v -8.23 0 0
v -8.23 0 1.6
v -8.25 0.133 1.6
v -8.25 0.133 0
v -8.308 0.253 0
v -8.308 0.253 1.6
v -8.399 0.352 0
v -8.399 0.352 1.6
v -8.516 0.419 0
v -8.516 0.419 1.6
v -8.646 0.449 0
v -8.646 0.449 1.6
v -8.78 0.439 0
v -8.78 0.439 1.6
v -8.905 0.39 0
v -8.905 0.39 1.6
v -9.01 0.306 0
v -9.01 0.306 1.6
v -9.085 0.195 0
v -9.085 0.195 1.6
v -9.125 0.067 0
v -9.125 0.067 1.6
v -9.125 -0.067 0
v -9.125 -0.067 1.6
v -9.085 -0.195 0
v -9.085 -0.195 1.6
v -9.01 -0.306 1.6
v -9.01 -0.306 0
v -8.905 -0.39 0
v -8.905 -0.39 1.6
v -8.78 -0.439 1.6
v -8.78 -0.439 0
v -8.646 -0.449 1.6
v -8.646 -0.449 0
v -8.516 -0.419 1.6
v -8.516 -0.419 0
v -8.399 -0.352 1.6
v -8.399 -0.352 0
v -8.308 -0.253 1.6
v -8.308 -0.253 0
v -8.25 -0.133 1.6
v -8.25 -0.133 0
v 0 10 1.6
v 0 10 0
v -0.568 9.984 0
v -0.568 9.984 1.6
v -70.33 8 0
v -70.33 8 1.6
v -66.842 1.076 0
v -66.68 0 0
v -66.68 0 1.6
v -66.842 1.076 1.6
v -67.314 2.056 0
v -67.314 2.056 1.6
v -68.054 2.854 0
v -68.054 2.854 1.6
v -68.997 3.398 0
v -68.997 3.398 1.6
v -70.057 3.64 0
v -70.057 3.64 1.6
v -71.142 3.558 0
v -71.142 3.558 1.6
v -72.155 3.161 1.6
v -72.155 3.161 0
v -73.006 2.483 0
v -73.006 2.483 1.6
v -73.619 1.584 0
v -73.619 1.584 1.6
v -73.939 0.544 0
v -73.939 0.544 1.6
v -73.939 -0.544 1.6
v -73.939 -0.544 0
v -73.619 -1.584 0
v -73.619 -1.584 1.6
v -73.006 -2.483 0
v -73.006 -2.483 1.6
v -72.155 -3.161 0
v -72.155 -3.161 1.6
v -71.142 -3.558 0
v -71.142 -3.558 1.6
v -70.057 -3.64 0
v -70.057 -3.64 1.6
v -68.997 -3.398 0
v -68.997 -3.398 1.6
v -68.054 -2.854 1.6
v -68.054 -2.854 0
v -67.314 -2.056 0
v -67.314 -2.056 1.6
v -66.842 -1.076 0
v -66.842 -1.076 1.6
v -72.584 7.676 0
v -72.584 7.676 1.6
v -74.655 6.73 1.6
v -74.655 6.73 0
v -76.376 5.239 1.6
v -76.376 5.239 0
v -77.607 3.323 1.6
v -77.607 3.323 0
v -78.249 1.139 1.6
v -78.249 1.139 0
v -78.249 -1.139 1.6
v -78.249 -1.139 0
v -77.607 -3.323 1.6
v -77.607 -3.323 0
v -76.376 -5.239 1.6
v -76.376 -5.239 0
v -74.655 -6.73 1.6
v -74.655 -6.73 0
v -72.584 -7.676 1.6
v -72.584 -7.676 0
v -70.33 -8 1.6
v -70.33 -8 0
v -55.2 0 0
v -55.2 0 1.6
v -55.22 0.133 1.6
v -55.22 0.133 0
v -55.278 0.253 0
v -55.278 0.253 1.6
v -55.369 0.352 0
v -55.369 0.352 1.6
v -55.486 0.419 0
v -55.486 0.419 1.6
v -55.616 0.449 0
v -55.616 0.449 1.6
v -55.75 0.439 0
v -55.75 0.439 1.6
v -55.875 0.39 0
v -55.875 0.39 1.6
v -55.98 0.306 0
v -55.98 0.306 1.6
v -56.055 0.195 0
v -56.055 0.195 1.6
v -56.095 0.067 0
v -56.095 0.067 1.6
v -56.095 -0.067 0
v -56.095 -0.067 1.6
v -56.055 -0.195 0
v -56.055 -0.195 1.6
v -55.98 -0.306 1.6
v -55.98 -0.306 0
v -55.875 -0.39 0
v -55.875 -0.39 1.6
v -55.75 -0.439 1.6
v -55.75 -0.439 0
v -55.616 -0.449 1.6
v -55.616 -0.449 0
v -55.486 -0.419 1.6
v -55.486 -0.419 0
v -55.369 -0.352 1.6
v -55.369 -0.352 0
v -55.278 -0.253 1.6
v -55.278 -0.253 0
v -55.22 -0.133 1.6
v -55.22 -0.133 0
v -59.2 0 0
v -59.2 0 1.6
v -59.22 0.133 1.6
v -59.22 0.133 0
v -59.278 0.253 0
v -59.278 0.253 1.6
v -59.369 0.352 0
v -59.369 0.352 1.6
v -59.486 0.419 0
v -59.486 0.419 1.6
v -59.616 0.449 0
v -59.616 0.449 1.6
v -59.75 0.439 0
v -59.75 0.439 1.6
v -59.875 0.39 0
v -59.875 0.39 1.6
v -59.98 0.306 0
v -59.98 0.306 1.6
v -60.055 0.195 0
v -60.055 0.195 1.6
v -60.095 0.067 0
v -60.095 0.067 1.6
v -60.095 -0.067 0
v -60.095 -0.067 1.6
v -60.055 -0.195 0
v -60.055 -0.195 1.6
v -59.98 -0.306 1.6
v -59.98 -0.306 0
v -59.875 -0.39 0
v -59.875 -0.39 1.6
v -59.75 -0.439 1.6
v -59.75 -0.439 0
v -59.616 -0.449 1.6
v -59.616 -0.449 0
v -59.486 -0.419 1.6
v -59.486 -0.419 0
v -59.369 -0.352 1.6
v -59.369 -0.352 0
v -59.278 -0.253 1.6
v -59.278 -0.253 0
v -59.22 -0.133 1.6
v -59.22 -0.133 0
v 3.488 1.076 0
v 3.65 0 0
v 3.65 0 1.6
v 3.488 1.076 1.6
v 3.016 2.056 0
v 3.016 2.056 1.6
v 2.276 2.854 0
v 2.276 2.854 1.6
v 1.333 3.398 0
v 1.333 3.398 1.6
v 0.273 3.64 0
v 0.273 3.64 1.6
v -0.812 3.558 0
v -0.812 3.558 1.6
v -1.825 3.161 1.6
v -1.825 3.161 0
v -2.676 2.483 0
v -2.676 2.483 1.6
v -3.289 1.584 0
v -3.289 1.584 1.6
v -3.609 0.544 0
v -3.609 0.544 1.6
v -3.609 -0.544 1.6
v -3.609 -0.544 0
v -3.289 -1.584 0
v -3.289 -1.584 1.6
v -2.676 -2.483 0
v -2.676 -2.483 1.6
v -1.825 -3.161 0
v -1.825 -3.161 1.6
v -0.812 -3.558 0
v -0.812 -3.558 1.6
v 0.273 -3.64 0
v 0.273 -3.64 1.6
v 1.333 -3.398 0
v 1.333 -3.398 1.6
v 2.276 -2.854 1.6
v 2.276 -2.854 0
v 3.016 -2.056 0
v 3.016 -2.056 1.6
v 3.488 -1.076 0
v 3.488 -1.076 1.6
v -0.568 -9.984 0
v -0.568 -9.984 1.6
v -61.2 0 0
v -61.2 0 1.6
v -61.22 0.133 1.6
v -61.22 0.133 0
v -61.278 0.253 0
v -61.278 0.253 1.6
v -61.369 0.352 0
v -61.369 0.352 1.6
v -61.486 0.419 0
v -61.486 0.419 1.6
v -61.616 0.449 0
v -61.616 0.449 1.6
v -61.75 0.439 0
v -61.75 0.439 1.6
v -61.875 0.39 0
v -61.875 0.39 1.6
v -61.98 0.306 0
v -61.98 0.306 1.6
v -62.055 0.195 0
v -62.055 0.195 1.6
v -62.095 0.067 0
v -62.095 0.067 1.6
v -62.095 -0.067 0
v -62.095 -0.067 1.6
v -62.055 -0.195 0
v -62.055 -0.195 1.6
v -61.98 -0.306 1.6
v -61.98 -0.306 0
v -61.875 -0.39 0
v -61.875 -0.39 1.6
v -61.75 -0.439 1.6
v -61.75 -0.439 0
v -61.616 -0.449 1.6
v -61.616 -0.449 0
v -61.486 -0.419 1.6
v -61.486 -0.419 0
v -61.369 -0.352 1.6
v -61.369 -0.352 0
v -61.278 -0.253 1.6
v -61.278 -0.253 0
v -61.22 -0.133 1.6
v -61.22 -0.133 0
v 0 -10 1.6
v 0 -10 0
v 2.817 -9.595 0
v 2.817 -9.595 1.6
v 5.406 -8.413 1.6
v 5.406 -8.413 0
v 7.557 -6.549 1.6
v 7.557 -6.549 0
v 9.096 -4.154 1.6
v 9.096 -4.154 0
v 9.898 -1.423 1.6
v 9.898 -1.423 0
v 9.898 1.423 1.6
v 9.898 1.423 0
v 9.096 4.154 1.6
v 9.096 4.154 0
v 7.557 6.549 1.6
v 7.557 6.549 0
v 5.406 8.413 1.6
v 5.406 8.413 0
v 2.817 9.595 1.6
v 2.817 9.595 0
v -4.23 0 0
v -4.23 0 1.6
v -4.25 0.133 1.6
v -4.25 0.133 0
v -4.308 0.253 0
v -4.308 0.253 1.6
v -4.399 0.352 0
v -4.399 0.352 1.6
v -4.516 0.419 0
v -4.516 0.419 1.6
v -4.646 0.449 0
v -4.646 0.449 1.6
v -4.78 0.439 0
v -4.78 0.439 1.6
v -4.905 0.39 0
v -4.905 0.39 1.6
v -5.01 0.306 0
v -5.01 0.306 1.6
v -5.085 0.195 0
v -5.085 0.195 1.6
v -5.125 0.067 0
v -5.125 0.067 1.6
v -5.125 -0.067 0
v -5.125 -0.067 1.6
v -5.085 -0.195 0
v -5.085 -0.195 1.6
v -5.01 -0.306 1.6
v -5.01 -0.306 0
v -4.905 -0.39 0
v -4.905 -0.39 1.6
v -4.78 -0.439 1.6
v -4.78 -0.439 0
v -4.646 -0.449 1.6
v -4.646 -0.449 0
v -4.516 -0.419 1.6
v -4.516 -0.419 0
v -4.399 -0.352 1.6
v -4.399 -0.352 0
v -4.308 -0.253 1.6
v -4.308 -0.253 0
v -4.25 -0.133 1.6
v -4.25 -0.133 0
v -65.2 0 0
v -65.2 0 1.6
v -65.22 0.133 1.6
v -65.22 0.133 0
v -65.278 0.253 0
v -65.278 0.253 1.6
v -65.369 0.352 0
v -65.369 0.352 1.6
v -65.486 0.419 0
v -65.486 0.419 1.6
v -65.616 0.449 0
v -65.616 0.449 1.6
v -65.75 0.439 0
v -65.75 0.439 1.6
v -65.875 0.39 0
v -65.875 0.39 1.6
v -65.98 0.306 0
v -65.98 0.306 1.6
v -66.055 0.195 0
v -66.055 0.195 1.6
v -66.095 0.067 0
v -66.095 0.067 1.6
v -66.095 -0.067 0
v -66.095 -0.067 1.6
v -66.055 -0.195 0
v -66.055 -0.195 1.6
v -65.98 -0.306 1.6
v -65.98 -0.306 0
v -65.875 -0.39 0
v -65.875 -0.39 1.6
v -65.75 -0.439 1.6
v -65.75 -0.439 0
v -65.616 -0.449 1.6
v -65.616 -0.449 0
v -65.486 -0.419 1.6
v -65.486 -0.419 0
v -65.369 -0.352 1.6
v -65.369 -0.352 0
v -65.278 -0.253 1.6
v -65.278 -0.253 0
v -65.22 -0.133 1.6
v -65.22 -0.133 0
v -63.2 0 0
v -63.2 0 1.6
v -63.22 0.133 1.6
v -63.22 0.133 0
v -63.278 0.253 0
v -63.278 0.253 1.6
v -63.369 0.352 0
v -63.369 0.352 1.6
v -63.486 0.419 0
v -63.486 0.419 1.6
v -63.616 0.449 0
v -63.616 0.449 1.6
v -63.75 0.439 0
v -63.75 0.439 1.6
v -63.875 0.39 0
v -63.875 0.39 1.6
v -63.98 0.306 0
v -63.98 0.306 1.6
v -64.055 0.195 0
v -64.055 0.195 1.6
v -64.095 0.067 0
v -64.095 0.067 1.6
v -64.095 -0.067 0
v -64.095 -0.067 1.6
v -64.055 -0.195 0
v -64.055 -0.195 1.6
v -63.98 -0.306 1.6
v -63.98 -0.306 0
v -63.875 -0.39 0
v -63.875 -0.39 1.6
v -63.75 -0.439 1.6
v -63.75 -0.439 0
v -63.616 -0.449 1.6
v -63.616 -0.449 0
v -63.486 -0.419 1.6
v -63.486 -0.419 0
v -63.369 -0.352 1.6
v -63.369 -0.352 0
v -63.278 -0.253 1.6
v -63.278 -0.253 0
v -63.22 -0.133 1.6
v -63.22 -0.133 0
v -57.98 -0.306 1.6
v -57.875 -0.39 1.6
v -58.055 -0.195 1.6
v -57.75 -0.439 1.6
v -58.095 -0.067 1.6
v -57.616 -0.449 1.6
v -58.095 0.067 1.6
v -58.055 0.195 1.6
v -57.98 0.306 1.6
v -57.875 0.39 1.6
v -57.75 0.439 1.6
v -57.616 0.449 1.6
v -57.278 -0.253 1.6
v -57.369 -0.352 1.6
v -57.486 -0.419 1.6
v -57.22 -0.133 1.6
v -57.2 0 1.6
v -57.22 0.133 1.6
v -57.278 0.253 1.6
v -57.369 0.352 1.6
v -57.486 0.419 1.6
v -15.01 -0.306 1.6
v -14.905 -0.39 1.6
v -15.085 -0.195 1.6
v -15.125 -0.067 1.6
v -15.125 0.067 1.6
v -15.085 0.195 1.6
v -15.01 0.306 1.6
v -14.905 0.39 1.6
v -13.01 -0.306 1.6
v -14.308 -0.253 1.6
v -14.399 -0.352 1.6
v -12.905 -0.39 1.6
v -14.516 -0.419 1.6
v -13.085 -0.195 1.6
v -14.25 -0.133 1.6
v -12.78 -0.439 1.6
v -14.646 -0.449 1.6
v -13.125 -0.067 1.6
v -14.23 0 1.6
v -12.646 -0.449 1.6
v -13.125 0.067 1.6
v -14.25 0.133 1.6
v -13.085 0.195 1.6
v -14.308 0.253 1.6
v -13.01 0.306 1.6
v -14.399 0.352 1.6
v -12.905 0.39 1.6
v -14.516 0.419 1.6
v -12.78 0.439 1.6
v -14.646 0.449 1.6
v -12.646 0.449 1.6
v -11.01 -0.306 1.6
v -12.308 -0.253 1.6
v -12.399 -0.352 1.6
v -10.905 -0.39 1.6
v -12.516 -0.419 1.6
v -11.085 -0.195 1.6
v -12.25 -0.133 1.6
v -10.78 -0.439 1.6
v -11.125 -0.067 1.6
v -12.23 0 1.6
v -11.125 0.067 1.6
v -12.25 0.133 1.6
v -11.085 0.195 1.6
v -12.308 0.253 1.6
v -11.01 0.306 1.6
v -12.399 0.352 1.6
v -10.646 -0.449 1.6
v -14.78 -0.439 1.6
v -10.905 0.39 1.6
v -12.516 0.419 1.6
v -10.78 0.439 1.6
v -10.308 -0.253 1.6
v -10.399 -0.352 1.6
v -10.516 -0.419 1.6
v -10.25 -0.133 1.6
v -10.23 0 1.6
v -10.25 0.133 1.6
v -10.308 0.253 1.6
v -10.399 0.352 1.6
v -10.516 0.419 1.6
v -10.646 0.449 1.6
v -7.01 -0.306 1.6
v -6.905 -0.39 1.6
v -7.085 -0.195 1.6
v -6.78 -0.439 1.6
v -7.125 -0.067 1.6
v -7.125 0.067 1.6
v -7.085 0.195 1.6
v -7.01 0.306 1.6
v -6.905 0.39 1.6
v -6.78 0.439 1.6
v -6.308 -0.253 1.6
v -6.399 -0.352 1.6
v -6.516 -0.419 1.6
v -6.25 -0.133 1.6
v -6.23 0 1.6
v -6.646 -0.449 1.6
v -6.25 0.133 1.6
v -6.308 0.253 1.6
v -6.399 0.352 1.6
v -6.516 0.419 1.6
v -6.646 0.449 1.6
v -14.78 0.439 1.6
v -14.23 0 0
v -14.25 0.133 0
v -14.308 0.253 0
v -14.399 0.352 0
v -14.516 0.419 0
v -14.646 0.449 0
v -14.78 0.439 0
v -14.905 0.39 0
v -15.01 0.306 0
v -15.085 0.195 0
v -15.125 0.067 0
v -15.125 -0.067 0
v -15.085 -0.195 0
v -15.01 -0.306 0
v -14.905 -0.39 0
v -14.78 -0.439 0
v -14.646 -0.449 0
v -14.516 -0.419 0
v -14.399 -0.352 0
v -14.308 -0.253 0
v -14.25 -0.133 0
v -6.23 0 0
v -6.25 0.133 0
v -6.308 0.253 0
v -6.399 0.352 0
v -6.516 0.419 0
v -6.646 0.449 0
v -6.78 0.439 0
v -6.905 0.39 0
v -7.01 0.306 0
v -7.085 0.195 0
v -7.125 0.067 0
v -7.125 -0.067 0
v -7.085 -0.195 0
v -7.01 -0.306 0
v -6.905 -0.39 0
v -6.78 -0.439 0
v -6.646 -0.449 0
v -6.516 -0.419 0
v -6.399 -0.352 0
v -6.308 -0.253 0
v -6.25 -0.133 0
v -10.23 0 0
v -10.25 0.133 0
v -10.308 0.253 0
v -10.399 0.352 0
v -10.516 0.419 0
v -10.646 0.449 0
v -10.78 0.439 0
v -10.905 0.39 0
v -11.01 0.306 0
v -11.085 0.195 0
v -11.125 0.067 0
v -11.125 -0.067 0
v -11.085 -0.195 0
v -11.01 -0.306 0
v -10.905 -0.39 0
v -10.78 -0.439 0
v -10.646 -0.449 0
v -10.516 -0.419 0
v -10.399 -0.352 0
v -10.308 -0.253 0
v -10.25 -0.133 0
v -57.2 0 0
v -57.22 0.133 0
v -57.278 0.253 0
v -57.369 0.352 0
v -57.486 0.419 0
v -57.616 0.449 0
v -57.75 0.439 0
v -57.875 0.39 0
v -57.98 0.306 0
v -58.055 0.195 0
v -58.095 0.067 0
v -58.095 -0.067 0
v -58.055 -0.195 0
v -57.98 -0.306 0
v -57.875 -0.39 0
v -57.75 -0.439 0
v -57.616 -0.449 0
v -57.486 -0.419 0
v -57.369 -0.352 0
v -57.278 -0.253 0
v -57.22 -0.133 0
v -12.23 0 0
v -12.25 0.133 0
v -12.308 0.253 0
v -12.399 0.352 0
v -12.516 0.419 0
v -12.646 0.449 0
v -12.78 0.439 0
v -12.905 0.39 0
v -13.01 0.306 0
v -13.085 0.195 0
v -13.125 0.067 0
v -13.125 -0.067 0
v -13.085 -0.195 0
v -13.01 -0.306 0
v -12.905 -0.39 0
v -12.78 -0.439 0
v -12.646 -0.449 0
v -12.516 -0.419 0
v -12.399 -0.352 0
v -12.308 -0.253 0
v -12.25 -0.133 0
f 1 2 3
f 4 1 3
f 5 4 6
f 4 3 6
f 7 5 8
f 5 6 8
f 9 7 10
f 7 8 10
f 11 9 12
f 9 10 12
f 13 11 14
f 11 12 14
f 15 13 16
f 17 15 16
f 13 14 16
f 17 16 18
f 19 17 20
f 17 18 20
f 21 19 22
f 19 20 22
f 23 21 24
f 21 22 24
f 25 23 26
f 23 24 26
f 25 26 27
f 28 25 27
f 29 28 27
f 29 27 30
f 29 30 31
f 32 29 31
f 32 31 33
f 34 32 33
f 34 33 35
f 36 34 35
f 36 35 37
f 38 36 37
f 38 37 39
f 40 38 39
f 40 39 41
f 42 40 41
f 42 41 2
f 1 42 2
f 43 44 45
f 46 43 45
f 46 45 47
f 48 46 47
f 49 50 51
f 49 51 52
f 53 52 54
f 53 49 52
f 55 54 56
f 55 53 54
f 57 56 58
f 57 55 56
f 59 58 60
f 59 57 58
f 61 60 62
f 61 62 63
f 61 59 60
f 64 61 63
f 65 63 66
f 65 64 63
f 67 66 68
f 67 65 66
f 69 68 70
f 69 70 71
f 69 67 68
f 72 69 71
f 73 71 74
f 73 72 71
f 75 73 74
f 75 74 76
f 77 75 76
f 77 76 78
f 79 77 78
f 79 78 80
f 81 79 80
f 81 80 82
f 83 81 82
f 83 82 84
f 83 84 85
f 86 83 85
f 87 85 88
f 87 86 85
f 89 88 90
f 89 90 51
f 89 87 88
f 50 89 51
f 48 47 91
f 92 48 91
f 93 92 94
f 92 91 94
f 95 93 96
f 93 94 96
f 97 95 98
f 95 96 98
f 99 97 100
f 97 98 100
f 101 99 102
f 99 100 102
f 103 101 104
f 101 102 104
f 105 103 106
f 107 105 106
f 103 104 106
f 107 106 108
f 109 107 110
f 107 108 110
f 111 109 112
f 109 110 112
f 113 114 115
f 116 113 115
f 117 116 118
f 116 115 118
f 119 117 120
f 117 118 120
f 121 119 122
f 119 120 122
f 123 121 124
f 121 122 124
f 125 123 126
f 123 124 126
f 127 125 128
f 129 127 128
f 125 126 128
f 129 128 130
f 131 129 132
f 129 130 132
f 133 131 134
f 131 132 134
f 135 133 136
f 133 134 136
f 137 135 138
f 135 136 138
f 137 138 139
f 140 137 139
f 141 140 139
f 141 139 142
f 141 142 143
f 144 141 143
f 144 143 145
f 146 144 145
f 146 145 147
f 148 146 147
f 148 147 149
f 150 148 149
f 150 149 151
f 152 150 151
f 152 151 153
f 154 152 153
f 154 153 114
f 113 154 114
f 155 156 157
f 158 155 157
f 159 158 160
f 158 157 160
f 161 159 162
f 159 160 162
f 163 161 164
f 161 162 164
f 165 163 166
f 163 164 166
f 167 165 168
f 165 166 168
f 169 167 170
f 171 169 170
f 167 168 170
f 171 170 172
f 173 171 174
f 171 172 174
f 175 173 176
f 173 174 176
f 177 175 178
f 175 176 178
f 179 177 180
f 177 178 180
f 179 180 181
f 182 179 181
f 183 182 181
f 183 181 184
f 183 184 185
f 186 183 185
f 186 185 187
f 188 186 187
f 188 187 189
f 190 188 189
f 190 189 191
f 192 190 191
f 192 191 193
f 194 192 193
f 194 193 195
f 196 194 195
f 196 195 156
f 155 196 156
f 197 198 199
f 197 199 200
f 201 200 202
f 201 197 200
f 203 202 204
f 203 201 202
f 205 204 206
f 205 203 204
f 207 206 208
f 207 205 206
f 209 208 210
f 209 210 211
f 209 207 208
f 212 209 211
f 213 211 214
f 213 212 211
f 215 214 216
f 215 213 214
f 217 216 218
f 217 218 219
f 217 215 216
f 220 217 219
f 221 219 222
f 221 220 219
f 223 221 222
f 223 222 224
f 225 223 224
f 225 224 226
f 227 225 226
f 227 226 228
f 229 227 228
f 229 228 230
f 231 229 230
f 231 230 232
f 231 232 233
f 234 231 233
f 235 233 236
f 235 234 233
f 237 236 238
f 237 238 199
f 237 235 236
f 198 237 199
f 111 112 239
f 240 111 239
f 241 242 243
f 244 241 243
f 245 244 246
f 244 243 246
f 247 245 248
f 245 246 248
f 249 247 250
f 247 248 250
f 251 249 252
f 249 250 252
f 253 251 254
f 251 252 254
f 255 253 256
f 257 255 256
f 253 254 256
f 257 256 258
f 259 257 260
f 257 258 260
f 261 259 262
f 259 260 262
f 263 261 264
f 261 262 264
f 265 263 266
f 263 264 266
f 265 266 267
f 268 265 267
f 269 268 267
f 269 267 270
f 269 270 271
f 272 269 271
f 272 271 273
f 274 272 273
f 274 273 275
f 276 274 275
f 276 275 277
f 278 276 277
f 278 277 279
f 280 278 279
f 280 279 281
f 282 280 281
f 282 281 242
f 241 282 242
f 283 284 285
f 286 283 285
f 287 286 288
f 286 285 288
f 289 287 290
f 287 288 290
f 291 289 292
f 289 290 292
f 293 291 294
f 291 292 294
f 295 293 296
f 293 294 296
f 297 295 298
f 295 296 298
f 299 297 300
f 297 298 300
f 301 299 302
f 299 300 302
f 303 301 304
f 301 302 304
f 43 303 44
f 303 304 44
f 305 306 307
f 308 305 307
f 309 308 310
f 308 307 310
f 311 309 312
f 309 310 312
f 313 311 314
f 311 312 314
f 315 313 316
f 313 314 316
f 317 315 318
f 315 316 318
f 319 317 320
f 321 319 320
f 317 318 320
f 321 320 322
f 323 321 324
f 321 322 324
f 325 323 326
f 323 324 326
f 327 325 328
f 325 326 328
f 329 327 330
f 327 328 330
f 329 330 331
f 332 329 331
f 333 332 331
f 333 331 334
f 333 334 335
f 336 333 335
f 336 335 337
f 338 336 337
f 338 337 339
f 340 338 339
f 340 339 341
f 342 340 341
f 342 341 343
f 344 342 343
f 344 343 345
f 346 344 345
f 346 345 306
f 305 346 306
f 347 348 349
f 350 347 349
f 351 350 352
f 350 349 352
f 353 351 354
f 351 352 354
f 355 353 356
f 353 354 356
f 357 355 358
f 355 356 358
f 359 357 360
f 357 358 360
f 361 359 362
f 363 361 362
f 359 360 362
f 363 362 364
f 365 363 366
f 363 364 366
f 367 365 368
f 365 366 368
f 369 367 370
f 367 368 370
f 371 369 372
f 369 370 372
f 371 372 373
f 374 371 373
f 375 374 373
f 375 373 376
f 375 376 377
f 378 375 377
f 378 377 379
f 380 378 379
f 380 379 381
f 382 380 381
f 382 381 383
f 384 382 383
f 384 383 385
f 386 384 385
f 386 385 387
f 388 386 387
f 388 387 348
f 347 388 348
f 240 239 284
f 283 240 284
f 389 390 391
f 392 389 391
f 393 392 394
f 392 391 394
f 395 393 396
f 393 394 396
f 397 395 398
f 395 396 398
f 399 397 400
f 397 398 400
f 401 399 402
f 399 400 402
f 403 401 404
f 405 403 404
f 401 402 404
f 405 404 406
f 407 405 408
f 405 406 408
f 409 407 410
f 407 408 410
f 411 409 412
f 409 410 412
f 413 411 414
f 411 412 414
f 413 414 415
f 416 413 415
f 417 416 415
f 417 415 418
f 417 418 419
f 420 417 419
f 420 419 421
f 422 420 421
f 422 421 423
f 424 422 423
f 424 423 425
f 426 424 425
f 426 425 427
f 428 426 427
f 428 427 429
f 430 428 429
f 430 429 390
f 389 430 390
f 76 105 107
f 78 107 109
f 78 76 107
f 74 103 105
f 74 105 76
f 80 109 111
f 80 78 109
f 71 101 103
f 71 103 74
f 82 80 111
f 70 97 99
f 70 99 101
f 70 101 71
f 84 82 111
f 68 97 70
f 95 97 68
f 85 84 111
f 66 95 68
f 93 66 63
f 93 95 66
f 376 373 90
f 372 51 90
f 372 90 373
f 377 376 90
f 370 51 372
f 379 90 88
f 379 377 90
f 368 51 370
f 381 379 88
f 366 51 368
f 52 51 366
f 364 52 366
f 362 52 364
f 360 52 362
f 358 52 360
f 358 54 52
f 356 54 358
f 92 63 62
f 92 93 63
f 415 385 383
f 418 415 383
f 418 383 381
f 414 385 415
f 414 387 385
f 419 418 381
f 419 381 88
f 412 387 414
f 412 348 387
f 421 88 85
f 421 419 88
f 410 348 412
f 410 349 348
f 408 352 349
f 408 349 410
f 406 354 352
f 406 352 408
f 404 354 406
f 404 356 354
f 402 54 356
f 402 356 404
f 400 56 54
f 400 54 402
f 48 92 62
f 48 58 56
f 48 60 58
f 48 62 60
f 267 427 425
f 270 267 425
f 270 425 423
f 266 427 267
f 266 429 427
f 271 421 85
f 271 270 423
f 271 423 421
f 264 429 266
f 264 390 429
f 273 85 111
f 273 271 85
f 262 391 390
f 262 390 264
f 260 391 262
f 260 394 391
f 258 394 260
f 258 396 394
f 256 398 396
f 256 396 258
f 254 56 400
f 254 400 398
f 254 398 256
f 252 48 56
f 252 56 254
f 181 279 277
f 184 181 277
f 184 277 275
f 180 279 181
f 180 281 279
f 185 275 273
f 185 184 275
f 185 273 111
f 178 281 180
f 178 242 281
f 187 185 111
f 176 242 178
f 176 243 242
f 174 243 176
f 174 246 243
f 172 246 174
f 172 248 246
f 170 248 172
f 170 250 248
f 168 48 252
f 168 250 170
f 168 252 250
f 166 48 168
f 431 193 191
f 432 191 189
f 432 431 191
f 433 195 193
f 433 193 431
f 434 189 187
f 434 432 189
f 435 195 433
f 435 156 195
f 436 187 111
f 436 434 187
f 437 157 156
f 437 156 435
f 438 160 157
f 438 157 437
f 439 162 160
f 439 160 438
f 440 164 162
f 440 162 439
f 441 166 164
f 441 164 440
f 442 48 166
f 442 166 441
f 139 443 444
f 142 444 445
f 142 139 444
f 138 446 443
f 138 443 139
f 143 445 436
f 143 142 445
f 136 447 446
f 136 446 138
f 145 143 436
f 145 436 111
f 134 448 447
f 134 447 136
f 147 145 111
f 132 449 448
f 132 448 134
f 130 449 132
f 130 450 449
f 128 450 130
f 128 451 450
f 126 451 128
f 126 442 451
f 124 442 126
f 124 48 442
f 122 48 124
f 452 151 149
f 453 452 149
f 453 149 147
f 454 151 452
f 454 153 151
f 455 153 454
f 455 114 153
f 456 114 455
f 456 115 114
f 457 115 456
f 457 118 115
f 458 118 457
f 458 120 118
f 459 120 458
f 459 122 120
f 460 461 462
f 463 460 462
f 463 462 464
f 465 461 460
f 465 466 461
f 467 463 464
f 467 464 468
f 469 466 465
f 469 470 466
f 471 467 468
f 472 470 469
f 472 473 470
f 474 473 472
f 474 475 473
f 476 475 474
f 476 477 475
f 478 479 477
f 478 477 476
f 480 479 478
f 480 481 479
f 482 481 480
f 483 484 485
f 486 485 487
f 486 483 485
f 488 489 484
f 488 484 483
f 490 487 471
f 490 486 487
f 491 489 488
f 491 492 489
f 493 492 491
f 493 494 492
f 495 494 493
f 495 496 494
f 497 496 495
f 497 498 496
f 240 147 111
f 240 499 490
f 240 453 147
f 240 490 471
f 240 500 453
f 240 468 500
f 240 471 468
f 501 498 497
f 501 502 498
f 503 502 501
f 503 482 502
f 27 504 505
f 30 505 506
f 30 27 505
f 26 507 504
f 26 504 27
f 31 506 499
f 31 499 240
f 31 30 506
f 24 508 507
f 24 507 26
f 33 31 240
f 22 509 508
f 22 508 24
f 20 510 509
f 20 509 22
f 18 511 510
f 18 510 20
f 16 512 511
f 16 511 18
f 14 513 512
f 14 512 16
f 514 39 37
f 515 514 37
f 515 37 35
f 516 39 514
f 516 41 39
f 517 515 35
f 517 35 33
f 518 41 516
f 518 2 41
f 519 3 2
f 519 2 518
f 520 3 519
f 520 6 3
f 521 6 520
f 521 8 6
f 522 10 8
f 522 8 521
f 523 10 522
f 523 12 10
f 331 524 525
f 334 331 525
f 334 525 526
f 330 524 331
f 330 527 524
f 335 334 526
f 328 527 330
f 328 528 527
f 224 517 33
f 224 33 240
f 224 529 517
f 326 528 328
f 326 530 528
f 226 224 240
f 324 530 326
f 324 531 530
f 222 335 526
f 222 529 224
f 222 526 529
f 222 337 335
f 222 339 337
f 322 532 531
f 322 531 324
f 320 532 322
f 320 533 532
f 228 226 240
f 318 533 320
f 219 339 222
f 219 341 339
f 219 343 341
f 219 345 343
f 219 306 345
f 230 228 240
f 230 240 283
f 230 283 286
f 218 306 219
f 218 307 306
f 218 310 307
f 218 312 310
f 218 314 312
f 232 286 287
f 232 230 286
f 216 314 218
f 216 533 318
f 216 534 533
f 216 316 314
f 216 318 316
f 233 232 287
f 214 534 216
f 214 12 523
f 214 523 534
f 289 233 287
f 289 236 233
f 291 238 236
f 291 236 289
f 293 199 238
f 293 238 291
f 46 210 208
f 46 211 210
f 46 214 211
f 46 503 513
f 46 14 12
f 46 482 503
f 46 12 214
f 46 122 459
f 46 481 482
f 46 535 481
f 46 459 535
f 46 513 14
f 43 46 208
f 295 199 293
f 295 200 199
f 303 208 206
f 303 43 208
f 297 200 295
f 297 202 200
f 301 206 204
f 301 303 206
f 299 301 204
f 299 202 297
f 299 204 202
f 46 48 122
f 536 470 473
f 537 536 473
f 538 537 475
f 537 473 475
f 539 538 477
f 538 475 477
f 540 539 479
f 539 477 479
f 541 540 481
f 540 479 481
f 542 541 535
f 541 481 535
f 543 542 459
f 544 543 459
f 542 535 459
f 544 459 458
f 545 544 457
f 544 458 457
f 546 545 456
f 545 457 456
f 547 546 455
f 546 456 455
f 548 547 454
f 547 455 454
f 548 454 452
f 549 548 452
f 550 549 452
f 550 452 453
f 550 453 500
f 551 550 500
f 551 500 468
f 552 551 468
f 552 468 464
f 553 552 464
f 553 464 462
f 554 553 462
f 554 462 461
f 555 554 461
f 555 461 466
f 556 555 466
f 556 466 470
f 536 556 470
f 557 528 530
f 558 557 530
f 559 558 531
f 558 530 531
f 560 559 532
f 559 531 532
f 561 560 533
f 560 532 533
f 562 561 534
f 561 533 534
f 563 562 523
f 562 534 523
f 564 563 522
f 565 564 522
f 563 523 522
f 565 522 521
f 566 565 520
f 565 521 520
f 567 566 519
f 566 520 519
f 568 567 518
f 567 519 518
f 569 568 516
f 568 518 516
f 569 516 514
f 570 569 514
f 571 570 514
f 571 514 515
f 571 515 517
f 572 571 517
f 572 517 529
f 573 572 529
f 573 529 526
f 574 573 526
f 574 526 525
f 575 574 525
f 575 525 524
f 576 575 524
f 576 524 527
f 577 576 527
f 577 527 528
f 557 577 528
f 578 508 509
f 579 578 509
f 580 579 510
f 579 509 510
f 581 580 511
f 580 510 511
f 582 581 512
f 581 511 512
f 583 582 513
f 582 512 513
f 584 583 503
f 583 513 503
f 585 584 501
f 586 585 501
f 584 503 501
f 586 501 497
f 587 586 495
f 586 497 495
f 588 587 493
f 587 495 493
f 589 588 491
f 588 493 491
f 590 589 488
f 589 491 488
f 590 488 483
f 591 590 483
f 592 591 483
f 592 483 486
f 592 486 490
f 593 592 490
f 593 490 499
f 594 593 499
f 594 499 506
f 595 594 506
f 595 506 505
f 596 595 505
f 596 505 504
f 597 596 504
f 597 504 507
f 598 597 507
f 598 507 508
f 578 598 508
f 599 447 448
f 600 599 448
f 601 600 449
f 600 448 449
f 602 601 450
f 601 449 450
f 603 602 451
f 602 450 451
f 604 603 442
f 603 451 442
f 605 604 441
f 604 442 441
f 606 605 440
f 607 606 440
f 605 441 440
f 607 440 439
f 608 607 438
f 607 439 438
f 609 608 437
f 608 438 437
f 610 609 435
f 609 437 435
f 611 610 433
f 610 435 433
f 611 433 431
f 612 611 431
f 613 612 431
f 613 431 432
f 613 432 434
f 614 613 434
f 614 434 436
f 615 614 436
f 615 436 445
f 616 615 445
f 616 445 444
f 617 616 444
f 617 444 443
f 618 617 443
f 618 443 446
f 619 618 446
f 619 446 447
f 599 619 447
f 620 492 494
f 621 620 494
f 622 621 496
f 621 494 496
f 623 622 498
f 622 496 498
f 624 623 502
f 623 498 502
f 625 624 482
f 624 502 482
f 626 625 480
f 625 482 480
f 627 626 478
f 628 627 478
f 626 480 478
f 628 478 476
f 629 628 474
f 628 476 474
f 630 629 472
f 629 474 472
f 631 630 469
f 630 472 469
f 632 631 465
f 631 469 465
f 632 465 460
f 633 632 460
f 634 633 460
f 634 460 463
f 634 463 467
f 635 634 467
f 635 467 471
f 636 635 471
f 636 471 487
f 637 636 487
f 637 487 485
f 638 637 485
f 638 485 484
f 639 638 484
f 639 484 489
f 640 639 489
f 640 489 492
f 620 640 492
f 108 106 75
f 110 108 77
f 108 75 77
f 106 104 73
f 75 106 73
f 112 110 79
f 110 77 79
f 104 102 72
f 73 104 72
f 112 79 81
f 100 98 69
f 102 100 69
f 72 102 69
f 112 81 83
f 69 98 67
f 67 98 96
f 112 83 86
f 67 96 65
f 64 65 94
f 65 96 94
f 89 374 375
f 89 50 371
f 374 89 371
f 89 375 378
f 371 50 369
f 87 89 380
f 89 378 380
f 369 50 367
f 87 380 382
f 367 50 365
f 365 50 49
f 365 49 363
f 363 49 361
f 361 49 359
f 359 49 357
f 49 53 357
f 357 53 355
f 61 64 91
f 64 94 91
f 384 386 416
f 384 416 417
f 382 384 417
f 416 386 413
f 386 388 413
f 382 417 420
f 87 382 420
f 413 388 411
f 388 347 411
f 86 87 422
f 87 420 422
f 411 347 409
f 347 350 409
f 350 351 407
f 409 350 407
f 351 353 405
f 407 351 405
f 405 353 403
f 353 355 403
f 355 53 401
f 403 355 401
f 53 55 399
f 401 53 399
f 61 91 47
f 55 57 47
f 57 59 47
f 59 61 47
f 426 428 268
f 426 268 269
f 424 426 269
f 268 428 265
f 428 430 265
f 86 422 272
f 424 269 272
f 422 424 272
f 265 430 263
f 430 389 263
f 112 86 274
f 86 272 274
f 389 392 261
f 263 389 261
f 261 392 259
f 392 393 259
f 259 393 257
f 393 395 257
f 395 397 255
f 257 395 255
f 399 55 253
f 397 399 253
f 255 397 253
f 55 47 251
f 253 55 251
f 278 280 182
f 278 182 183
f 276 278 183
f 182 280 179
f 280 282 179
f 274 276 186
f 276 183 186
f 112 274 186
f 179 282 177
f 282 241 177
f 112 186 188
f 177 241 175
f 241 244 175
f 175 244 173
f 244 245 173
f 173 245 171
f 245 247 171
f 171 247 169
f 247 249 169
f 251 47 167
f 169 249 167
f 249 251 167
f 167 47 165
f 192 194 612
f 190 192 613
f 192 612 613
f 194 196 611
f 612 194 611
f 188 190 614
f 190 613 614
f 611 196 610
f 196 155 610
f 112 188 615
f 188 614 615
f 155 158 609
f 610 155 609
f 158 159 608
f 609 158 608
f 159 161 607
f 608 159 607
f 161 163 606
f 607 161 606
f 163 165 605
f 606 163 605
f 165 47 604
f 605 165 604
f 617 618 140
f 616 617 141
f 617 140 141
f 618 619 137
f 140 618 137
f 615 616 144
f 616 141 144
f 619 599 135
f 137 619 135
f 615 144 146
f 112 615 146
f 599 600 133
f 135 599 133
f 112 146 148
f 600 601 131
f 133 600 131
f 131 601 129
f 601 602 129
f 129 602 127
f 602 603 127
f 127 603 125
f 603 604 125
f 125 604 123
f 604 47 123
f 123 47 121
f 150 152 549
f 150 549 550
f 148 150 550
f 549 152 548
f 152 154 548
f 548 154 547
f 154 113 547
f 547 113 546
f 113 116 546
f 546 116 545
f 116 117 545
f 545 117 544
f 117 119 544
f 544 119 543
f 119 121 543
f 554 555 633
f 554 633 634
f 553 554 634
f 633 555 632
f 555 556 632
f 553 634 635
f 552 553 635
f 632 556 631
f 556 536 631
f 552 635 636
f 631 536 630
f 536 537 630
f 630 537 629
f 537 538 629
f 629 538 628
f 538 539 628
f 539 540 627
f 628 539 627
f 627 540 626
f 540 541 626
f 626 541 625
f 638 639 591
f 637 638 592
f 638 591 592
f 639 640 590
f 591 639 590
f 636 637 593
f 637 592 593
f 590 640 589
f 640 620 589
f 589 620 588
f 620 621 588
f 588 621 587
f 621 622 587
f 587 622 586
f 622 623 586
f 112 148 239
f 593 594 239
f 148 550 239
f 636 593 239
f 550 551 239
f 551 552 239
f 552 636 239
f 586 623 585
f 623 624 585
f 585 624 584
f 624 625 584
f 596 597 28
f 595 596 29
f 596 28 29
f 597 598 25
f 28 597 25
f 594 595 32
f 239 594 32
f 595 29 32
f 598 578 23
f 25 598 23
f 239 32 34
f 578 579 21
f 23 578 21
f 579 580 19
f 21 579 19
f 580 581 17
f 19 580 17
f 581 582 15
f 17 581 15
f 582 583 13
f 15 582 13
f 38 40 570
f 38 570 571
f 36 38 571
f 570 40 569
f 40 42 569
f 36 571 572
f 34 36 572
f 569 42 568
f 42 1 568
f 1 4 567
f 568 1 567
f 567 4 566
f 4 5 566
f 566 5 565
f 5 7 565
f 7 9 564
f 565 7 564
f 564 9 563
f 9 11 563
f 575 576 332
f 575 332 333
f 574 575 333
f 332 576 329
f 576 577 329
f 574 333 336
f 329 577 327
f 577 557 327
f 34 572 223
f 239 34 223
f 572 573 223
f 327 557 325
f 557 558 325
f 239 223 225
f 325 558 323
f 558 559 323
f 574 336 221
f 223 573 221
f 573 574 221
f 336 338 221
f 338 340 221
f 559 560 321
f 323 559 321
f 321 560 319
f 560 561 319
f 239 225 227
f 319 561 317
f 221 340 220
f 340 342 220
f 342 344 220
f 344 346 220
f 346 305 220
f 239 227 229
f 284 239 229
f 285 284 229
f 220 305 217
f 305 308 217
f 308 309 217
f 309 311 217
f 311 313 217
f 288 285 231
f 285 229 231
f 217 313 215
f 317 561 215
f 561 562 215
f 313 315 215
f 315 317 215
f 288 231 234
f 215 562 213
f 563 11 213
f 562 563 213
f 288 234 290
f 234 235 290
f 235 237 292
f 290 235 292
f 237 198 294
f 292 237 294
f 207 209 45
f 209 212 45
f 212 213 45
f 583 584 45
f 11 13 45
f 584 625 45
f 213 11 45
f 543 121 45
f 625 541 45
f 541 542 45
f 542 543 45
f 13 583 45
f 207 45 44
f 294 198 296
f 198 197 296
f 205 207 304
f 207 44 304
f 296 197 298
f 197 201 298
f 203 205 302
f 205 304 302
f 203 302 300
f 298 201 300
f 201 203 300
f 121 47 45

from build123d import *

# Parameters (mm, degrees)
ESBO_O1_R                = 3.65
RESSALTO_EXTRUS_O1_DEPTH = 1.6
CORTE_EXTRUS_O2_REACH    = 80.982
ESBO_O3_R                = 0.45


with BuildPart() as part:
    # Esboço1 → Ressalto-extrusão1 (new body)
    with BuildSketch(Plane.XY):
        with BuildLine():
            Line((-0.568287769, 9.983839392), (-70.33, 8))
            ThreePointArc((-70.33, 8), (-78.33, 0), (-70.33, -8))
            Line((-70.33, -8), (-0.568287769, -9.983839392))
            Line((-0.568287769, -9.983839392), (0, -10))
            ThreePointArc((0, -10), (10, 0), (0, 10))
            Line((0, 10), (-0.568287769, 9.983839392))
        make_face()
        with Locations((-70.33, 0)):
            Circle(ESBO_O1_R, mode=Mode.SUBTRACT)
        Circle(ESBO_O1_R, mode=Mode.SUBTRACT)
    extrude(amount=RESSALTO_EXTRUS_O1_DEPTH)

    # Esboço3 → Corte-extrusão2 (cut, up to next)
    with BuildSketch(Plane.XY.offset(1.6), mode=Mode.PRIVATE) as corte_extrus_o2_sk1:
        with Locations((-65.65, 0)):
            Circle(ESBO_O3_R)
    corte_extrus_o2_tool1 = extrude(corte_extrus_o2_sk1.sketch, amount=-CORTE_EXTRUS_O2_REACH, mode=Mode.PRIVATE) & part.part
    # Esboço3 → Corte-extrusão2 (cut, up to next)
    with BuildSketch(Plane.XY.offset(1.6), mode=Mode.PRIVATE) as corte_extrus_o2_sk2:
        with Locations((-4.68, 0)):
            Circle(ESBO_O3_R)
    corte_extrus_o2_tool2 = extrude(corte_extrus_o2_sk2.sketch, amount=-CORTE_EXTRUS_O2_REACH, mode=Mode.PRIVATE) & part.part
    # Esboço3 → Corte-extrusão2 (cut, up to next)
    with BuildSketch(Plane.XY.offset(1.6), mode=Mode.PRIVATE) as corte_extrus_o2_sk3:
        with Locations((-6.68, 0)):
            Circle(ESBO_O3_R)
    corte_extrus_o2_tool3 = extrude(corte_extrus_o2_sk3.sketch, amount=-CORTE_EXTRUS_O2_REACH, mode=Mode.PRIVATE) & part.part
    # Esboço3 → Corte-extrusão2 (cut, up to next)
    with BuildSketch(Plane.XY.offset(1.6), mode=Mode.PRIVATE) as corte_extrus_o2_sk4:
        with Locations((-8.68, 0)):
            Circle(ESBO_O3_R)
    corte_extrus_o2_tool4 = extrude(corte_extrus_o2_sk4.sketch, amount=-CORTE_EXTRUS_O2_REACH, mode=Mode.PRIVATE) & part.part
    # Esboço3 → Corte-extrusão2 (cut, up to next)
    with BuildSketch(Plane.XY.offset(1.6), mode=Mode.PRIVATE) as corte_extrus_o2_sk5:
        with Locations((-10.68, 0)):
            Circle(ESBO_O3_R)
    corte_extrus_o2_tool5 = extrude(corte_extrus_o2_sk5.sketch, amount=-CORTE_EXTRUS_O2_REACH, mode=Mode.PRIVATE) & part.part
    # Esboço3 → Corte-extrusão2 (cut, up to next)
    with BuildSketch(Plane.XY.offset(1.6), mode=Mode.PRIVATE) as corte_extrus_o2_sk6:
        with Locations((-12.68, 0)):
            Circle(ESBO_O3_R)
    corte_extrus_o2_tool6 = extrude(corte_extrus_o2_sk6.sketch, amount=-CORTE_EXTRUS_O2_REACH, mode=Mode.PRIVATE) & part.part
    # Esboço3 → Corte-extrusão2 (cut, up to next)
    with BuildSketch(Plane.XY.offset(1.6), mode=Mode.PRIVATE) as corte_extrus_o2_sk7:
        with Locations((-14.68, 0)):
            Circle(ESBO_O3_R)
    corte_extrus_o2_tool7 = extrude(corte_extrus_o2_sk7.sketch, amount=-CORTE_EXTRUS_O2_REACH, mode=Mode.PRIVATE) & part.part
    # Esboço3 → Corte-extrusão2 (cut, up to next)
    with BuildSketch(Plane.XY.offset(1.6), mode=Mode.PRIVATE) as corte_extrus_o2_sk8:
        with Locations((-63.65, 0)):
            Circle(ESBO_O3_R)
    corte_extrus_o2_tool8 = extrude(corte_extrus_o2_sk8.sketch, amount=-CORTE_EXTRUS_O2_REACH, mode=Mode.PRIVATE) & part.part
    # Esboço3 → Corte-extrusão2 (cut, up to next)
    with BuildSketch(Plane.XY.offset(1.6), mode=Mode.PRIVATE) as corte_extrus_o2_sk9:
        with Locations((-61.65, 0)):
            Circle(ESBO_O3_R)
    corte_extrus_o2_tool9 = extrude(corte_extrus_o2_sk9.sketch, amount=-CORTE_EXTRUS_O2_REACH, mode=Mode.PRIVATE) & part.part
    # Esboço3 → Corte-extrusão2 (cut, up to next)
    with BuildSketch(Plane.XY.offset(1.6), mode=Mode.PRIVATE) as corte_extrus_o2_sk10:
        with Locations((-59.65, 0)):
            Circle(ESBO_O3_R)
    corte_extrus_o2_tool10 = extrude(corte_extrus_o2_sk10.sketch, amount=-CORTE_EXTRUS_O2_REACH, mode=Mode.PRIVATE) & part.part
    # Esboço3 → Corte-extrusão2 (cut, up to next)
    with BuildSketch(Plane.XY.offset(1.6), mode=Mode.PRIVATE) as corte_extrus_o2_sk11:
        with Locations((-57.65, 0)):
            Circle(ESBO_O3_R)
    corte_extrus_o2_tool11 = extrude(corte_extrus_o2_sk11.sketch, amount=-CORTE_EXTRUS_O2_REACH, mode=Mode.PRIVATE) & part.part
    # Esboço3 → Corte-extrusão2 (cut, up to next)
    with BuildSketch(Plane.XY.offset(1.6), mode=Mode.PRIVATE) as corte_extrus_o2_sk12:
        with Locations((-55.65, 0)):
            Circle(ESBO_O3_R)
    corte_extrus_o2_tool12 = extrude(corte_extrus_o2_sk12.sketch, amount=-CORTE_EXTRUS_O2_REACH, mode=Mode.PRIVATE) & part.part
    add(corte_extrus_o2_tool1.solids().sort_by_distance((-65.65, 0, 1.6))[0], mode=Mode.SUBTRACT)
    add(corte_extrus_o2_tool2.solids().sort_by_distance((-4.68, 0, 1.6))[0], mode=Mode.SUBTRACT)
    add(corte_extrus_o2_tool3.solids().sort_by_distance((-6.68, 0, 1.6))[0], mode=Mode.SUBTRACT)
    add(corte_extrus_o2_tool4.solids().sort_by_distance((-8.68, 0, 1.6))[0], mode=Mode.SUBTRACT)
    add(corte_extrus_o2_tool5.solids().sort_by_distance((-10.68, 0, 1.6))[0], mode=Mode.SUBTRACT)
    add(corte_extrus_o2_tool6.solids().sort_by_distance((-12.68, 0, 1.6))[0], mode=Mode.SUBTRACT)
    add(corte_extrus_o2_tool7.solids().sort_by_distance((-14.68, 0, 1.6))[0], mode=Mode.SUBTRACT)
    add(corte_extrus_o2_tool8.solids().sort_by_distance((-63.65, 0, 1.6))[0], mode=Mode.SUBTRACT)
    add(corte_extrus_o2_tool9.solids().sort_by_distance((-61.65, 0, 1.6))[0], mode=Mode.SUBTRACT)
    add(corte_extrus_o2_tool10.solids().sort_by_distance((-59.65, 0, 1.6))[0], mode=Mode.SUBTRACT)
    add(corte_extrus_o2_tool11.solids().sort_by_distance((-57.65, 0, 1.6))[0], mode=Mode.SUBTRACT)
    add(corte_extrus_o2_tool12.solids().sort_by_distance((-55.65, 0, 1.6))[0], mode=Mode.SUBTRACT)


solid = part.part
